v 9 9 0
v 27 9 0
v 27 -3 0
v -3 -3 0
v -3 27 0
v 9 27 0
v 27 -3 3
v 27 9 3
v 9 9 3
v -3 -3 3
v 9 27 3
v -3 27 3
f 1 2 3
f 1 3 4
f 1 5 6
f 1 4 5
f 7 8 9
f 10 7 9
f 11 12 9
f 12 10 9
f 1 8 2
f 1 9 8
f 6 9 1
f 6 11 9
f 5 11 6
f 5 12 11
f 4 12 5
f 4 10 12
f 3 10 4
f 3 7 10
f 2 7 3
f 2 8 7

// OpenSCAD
linear_extrude(3) offset(delta=3) polygon([[0,0],[24,0],[24,6],[6,6],[6,24],[0,24]]);
